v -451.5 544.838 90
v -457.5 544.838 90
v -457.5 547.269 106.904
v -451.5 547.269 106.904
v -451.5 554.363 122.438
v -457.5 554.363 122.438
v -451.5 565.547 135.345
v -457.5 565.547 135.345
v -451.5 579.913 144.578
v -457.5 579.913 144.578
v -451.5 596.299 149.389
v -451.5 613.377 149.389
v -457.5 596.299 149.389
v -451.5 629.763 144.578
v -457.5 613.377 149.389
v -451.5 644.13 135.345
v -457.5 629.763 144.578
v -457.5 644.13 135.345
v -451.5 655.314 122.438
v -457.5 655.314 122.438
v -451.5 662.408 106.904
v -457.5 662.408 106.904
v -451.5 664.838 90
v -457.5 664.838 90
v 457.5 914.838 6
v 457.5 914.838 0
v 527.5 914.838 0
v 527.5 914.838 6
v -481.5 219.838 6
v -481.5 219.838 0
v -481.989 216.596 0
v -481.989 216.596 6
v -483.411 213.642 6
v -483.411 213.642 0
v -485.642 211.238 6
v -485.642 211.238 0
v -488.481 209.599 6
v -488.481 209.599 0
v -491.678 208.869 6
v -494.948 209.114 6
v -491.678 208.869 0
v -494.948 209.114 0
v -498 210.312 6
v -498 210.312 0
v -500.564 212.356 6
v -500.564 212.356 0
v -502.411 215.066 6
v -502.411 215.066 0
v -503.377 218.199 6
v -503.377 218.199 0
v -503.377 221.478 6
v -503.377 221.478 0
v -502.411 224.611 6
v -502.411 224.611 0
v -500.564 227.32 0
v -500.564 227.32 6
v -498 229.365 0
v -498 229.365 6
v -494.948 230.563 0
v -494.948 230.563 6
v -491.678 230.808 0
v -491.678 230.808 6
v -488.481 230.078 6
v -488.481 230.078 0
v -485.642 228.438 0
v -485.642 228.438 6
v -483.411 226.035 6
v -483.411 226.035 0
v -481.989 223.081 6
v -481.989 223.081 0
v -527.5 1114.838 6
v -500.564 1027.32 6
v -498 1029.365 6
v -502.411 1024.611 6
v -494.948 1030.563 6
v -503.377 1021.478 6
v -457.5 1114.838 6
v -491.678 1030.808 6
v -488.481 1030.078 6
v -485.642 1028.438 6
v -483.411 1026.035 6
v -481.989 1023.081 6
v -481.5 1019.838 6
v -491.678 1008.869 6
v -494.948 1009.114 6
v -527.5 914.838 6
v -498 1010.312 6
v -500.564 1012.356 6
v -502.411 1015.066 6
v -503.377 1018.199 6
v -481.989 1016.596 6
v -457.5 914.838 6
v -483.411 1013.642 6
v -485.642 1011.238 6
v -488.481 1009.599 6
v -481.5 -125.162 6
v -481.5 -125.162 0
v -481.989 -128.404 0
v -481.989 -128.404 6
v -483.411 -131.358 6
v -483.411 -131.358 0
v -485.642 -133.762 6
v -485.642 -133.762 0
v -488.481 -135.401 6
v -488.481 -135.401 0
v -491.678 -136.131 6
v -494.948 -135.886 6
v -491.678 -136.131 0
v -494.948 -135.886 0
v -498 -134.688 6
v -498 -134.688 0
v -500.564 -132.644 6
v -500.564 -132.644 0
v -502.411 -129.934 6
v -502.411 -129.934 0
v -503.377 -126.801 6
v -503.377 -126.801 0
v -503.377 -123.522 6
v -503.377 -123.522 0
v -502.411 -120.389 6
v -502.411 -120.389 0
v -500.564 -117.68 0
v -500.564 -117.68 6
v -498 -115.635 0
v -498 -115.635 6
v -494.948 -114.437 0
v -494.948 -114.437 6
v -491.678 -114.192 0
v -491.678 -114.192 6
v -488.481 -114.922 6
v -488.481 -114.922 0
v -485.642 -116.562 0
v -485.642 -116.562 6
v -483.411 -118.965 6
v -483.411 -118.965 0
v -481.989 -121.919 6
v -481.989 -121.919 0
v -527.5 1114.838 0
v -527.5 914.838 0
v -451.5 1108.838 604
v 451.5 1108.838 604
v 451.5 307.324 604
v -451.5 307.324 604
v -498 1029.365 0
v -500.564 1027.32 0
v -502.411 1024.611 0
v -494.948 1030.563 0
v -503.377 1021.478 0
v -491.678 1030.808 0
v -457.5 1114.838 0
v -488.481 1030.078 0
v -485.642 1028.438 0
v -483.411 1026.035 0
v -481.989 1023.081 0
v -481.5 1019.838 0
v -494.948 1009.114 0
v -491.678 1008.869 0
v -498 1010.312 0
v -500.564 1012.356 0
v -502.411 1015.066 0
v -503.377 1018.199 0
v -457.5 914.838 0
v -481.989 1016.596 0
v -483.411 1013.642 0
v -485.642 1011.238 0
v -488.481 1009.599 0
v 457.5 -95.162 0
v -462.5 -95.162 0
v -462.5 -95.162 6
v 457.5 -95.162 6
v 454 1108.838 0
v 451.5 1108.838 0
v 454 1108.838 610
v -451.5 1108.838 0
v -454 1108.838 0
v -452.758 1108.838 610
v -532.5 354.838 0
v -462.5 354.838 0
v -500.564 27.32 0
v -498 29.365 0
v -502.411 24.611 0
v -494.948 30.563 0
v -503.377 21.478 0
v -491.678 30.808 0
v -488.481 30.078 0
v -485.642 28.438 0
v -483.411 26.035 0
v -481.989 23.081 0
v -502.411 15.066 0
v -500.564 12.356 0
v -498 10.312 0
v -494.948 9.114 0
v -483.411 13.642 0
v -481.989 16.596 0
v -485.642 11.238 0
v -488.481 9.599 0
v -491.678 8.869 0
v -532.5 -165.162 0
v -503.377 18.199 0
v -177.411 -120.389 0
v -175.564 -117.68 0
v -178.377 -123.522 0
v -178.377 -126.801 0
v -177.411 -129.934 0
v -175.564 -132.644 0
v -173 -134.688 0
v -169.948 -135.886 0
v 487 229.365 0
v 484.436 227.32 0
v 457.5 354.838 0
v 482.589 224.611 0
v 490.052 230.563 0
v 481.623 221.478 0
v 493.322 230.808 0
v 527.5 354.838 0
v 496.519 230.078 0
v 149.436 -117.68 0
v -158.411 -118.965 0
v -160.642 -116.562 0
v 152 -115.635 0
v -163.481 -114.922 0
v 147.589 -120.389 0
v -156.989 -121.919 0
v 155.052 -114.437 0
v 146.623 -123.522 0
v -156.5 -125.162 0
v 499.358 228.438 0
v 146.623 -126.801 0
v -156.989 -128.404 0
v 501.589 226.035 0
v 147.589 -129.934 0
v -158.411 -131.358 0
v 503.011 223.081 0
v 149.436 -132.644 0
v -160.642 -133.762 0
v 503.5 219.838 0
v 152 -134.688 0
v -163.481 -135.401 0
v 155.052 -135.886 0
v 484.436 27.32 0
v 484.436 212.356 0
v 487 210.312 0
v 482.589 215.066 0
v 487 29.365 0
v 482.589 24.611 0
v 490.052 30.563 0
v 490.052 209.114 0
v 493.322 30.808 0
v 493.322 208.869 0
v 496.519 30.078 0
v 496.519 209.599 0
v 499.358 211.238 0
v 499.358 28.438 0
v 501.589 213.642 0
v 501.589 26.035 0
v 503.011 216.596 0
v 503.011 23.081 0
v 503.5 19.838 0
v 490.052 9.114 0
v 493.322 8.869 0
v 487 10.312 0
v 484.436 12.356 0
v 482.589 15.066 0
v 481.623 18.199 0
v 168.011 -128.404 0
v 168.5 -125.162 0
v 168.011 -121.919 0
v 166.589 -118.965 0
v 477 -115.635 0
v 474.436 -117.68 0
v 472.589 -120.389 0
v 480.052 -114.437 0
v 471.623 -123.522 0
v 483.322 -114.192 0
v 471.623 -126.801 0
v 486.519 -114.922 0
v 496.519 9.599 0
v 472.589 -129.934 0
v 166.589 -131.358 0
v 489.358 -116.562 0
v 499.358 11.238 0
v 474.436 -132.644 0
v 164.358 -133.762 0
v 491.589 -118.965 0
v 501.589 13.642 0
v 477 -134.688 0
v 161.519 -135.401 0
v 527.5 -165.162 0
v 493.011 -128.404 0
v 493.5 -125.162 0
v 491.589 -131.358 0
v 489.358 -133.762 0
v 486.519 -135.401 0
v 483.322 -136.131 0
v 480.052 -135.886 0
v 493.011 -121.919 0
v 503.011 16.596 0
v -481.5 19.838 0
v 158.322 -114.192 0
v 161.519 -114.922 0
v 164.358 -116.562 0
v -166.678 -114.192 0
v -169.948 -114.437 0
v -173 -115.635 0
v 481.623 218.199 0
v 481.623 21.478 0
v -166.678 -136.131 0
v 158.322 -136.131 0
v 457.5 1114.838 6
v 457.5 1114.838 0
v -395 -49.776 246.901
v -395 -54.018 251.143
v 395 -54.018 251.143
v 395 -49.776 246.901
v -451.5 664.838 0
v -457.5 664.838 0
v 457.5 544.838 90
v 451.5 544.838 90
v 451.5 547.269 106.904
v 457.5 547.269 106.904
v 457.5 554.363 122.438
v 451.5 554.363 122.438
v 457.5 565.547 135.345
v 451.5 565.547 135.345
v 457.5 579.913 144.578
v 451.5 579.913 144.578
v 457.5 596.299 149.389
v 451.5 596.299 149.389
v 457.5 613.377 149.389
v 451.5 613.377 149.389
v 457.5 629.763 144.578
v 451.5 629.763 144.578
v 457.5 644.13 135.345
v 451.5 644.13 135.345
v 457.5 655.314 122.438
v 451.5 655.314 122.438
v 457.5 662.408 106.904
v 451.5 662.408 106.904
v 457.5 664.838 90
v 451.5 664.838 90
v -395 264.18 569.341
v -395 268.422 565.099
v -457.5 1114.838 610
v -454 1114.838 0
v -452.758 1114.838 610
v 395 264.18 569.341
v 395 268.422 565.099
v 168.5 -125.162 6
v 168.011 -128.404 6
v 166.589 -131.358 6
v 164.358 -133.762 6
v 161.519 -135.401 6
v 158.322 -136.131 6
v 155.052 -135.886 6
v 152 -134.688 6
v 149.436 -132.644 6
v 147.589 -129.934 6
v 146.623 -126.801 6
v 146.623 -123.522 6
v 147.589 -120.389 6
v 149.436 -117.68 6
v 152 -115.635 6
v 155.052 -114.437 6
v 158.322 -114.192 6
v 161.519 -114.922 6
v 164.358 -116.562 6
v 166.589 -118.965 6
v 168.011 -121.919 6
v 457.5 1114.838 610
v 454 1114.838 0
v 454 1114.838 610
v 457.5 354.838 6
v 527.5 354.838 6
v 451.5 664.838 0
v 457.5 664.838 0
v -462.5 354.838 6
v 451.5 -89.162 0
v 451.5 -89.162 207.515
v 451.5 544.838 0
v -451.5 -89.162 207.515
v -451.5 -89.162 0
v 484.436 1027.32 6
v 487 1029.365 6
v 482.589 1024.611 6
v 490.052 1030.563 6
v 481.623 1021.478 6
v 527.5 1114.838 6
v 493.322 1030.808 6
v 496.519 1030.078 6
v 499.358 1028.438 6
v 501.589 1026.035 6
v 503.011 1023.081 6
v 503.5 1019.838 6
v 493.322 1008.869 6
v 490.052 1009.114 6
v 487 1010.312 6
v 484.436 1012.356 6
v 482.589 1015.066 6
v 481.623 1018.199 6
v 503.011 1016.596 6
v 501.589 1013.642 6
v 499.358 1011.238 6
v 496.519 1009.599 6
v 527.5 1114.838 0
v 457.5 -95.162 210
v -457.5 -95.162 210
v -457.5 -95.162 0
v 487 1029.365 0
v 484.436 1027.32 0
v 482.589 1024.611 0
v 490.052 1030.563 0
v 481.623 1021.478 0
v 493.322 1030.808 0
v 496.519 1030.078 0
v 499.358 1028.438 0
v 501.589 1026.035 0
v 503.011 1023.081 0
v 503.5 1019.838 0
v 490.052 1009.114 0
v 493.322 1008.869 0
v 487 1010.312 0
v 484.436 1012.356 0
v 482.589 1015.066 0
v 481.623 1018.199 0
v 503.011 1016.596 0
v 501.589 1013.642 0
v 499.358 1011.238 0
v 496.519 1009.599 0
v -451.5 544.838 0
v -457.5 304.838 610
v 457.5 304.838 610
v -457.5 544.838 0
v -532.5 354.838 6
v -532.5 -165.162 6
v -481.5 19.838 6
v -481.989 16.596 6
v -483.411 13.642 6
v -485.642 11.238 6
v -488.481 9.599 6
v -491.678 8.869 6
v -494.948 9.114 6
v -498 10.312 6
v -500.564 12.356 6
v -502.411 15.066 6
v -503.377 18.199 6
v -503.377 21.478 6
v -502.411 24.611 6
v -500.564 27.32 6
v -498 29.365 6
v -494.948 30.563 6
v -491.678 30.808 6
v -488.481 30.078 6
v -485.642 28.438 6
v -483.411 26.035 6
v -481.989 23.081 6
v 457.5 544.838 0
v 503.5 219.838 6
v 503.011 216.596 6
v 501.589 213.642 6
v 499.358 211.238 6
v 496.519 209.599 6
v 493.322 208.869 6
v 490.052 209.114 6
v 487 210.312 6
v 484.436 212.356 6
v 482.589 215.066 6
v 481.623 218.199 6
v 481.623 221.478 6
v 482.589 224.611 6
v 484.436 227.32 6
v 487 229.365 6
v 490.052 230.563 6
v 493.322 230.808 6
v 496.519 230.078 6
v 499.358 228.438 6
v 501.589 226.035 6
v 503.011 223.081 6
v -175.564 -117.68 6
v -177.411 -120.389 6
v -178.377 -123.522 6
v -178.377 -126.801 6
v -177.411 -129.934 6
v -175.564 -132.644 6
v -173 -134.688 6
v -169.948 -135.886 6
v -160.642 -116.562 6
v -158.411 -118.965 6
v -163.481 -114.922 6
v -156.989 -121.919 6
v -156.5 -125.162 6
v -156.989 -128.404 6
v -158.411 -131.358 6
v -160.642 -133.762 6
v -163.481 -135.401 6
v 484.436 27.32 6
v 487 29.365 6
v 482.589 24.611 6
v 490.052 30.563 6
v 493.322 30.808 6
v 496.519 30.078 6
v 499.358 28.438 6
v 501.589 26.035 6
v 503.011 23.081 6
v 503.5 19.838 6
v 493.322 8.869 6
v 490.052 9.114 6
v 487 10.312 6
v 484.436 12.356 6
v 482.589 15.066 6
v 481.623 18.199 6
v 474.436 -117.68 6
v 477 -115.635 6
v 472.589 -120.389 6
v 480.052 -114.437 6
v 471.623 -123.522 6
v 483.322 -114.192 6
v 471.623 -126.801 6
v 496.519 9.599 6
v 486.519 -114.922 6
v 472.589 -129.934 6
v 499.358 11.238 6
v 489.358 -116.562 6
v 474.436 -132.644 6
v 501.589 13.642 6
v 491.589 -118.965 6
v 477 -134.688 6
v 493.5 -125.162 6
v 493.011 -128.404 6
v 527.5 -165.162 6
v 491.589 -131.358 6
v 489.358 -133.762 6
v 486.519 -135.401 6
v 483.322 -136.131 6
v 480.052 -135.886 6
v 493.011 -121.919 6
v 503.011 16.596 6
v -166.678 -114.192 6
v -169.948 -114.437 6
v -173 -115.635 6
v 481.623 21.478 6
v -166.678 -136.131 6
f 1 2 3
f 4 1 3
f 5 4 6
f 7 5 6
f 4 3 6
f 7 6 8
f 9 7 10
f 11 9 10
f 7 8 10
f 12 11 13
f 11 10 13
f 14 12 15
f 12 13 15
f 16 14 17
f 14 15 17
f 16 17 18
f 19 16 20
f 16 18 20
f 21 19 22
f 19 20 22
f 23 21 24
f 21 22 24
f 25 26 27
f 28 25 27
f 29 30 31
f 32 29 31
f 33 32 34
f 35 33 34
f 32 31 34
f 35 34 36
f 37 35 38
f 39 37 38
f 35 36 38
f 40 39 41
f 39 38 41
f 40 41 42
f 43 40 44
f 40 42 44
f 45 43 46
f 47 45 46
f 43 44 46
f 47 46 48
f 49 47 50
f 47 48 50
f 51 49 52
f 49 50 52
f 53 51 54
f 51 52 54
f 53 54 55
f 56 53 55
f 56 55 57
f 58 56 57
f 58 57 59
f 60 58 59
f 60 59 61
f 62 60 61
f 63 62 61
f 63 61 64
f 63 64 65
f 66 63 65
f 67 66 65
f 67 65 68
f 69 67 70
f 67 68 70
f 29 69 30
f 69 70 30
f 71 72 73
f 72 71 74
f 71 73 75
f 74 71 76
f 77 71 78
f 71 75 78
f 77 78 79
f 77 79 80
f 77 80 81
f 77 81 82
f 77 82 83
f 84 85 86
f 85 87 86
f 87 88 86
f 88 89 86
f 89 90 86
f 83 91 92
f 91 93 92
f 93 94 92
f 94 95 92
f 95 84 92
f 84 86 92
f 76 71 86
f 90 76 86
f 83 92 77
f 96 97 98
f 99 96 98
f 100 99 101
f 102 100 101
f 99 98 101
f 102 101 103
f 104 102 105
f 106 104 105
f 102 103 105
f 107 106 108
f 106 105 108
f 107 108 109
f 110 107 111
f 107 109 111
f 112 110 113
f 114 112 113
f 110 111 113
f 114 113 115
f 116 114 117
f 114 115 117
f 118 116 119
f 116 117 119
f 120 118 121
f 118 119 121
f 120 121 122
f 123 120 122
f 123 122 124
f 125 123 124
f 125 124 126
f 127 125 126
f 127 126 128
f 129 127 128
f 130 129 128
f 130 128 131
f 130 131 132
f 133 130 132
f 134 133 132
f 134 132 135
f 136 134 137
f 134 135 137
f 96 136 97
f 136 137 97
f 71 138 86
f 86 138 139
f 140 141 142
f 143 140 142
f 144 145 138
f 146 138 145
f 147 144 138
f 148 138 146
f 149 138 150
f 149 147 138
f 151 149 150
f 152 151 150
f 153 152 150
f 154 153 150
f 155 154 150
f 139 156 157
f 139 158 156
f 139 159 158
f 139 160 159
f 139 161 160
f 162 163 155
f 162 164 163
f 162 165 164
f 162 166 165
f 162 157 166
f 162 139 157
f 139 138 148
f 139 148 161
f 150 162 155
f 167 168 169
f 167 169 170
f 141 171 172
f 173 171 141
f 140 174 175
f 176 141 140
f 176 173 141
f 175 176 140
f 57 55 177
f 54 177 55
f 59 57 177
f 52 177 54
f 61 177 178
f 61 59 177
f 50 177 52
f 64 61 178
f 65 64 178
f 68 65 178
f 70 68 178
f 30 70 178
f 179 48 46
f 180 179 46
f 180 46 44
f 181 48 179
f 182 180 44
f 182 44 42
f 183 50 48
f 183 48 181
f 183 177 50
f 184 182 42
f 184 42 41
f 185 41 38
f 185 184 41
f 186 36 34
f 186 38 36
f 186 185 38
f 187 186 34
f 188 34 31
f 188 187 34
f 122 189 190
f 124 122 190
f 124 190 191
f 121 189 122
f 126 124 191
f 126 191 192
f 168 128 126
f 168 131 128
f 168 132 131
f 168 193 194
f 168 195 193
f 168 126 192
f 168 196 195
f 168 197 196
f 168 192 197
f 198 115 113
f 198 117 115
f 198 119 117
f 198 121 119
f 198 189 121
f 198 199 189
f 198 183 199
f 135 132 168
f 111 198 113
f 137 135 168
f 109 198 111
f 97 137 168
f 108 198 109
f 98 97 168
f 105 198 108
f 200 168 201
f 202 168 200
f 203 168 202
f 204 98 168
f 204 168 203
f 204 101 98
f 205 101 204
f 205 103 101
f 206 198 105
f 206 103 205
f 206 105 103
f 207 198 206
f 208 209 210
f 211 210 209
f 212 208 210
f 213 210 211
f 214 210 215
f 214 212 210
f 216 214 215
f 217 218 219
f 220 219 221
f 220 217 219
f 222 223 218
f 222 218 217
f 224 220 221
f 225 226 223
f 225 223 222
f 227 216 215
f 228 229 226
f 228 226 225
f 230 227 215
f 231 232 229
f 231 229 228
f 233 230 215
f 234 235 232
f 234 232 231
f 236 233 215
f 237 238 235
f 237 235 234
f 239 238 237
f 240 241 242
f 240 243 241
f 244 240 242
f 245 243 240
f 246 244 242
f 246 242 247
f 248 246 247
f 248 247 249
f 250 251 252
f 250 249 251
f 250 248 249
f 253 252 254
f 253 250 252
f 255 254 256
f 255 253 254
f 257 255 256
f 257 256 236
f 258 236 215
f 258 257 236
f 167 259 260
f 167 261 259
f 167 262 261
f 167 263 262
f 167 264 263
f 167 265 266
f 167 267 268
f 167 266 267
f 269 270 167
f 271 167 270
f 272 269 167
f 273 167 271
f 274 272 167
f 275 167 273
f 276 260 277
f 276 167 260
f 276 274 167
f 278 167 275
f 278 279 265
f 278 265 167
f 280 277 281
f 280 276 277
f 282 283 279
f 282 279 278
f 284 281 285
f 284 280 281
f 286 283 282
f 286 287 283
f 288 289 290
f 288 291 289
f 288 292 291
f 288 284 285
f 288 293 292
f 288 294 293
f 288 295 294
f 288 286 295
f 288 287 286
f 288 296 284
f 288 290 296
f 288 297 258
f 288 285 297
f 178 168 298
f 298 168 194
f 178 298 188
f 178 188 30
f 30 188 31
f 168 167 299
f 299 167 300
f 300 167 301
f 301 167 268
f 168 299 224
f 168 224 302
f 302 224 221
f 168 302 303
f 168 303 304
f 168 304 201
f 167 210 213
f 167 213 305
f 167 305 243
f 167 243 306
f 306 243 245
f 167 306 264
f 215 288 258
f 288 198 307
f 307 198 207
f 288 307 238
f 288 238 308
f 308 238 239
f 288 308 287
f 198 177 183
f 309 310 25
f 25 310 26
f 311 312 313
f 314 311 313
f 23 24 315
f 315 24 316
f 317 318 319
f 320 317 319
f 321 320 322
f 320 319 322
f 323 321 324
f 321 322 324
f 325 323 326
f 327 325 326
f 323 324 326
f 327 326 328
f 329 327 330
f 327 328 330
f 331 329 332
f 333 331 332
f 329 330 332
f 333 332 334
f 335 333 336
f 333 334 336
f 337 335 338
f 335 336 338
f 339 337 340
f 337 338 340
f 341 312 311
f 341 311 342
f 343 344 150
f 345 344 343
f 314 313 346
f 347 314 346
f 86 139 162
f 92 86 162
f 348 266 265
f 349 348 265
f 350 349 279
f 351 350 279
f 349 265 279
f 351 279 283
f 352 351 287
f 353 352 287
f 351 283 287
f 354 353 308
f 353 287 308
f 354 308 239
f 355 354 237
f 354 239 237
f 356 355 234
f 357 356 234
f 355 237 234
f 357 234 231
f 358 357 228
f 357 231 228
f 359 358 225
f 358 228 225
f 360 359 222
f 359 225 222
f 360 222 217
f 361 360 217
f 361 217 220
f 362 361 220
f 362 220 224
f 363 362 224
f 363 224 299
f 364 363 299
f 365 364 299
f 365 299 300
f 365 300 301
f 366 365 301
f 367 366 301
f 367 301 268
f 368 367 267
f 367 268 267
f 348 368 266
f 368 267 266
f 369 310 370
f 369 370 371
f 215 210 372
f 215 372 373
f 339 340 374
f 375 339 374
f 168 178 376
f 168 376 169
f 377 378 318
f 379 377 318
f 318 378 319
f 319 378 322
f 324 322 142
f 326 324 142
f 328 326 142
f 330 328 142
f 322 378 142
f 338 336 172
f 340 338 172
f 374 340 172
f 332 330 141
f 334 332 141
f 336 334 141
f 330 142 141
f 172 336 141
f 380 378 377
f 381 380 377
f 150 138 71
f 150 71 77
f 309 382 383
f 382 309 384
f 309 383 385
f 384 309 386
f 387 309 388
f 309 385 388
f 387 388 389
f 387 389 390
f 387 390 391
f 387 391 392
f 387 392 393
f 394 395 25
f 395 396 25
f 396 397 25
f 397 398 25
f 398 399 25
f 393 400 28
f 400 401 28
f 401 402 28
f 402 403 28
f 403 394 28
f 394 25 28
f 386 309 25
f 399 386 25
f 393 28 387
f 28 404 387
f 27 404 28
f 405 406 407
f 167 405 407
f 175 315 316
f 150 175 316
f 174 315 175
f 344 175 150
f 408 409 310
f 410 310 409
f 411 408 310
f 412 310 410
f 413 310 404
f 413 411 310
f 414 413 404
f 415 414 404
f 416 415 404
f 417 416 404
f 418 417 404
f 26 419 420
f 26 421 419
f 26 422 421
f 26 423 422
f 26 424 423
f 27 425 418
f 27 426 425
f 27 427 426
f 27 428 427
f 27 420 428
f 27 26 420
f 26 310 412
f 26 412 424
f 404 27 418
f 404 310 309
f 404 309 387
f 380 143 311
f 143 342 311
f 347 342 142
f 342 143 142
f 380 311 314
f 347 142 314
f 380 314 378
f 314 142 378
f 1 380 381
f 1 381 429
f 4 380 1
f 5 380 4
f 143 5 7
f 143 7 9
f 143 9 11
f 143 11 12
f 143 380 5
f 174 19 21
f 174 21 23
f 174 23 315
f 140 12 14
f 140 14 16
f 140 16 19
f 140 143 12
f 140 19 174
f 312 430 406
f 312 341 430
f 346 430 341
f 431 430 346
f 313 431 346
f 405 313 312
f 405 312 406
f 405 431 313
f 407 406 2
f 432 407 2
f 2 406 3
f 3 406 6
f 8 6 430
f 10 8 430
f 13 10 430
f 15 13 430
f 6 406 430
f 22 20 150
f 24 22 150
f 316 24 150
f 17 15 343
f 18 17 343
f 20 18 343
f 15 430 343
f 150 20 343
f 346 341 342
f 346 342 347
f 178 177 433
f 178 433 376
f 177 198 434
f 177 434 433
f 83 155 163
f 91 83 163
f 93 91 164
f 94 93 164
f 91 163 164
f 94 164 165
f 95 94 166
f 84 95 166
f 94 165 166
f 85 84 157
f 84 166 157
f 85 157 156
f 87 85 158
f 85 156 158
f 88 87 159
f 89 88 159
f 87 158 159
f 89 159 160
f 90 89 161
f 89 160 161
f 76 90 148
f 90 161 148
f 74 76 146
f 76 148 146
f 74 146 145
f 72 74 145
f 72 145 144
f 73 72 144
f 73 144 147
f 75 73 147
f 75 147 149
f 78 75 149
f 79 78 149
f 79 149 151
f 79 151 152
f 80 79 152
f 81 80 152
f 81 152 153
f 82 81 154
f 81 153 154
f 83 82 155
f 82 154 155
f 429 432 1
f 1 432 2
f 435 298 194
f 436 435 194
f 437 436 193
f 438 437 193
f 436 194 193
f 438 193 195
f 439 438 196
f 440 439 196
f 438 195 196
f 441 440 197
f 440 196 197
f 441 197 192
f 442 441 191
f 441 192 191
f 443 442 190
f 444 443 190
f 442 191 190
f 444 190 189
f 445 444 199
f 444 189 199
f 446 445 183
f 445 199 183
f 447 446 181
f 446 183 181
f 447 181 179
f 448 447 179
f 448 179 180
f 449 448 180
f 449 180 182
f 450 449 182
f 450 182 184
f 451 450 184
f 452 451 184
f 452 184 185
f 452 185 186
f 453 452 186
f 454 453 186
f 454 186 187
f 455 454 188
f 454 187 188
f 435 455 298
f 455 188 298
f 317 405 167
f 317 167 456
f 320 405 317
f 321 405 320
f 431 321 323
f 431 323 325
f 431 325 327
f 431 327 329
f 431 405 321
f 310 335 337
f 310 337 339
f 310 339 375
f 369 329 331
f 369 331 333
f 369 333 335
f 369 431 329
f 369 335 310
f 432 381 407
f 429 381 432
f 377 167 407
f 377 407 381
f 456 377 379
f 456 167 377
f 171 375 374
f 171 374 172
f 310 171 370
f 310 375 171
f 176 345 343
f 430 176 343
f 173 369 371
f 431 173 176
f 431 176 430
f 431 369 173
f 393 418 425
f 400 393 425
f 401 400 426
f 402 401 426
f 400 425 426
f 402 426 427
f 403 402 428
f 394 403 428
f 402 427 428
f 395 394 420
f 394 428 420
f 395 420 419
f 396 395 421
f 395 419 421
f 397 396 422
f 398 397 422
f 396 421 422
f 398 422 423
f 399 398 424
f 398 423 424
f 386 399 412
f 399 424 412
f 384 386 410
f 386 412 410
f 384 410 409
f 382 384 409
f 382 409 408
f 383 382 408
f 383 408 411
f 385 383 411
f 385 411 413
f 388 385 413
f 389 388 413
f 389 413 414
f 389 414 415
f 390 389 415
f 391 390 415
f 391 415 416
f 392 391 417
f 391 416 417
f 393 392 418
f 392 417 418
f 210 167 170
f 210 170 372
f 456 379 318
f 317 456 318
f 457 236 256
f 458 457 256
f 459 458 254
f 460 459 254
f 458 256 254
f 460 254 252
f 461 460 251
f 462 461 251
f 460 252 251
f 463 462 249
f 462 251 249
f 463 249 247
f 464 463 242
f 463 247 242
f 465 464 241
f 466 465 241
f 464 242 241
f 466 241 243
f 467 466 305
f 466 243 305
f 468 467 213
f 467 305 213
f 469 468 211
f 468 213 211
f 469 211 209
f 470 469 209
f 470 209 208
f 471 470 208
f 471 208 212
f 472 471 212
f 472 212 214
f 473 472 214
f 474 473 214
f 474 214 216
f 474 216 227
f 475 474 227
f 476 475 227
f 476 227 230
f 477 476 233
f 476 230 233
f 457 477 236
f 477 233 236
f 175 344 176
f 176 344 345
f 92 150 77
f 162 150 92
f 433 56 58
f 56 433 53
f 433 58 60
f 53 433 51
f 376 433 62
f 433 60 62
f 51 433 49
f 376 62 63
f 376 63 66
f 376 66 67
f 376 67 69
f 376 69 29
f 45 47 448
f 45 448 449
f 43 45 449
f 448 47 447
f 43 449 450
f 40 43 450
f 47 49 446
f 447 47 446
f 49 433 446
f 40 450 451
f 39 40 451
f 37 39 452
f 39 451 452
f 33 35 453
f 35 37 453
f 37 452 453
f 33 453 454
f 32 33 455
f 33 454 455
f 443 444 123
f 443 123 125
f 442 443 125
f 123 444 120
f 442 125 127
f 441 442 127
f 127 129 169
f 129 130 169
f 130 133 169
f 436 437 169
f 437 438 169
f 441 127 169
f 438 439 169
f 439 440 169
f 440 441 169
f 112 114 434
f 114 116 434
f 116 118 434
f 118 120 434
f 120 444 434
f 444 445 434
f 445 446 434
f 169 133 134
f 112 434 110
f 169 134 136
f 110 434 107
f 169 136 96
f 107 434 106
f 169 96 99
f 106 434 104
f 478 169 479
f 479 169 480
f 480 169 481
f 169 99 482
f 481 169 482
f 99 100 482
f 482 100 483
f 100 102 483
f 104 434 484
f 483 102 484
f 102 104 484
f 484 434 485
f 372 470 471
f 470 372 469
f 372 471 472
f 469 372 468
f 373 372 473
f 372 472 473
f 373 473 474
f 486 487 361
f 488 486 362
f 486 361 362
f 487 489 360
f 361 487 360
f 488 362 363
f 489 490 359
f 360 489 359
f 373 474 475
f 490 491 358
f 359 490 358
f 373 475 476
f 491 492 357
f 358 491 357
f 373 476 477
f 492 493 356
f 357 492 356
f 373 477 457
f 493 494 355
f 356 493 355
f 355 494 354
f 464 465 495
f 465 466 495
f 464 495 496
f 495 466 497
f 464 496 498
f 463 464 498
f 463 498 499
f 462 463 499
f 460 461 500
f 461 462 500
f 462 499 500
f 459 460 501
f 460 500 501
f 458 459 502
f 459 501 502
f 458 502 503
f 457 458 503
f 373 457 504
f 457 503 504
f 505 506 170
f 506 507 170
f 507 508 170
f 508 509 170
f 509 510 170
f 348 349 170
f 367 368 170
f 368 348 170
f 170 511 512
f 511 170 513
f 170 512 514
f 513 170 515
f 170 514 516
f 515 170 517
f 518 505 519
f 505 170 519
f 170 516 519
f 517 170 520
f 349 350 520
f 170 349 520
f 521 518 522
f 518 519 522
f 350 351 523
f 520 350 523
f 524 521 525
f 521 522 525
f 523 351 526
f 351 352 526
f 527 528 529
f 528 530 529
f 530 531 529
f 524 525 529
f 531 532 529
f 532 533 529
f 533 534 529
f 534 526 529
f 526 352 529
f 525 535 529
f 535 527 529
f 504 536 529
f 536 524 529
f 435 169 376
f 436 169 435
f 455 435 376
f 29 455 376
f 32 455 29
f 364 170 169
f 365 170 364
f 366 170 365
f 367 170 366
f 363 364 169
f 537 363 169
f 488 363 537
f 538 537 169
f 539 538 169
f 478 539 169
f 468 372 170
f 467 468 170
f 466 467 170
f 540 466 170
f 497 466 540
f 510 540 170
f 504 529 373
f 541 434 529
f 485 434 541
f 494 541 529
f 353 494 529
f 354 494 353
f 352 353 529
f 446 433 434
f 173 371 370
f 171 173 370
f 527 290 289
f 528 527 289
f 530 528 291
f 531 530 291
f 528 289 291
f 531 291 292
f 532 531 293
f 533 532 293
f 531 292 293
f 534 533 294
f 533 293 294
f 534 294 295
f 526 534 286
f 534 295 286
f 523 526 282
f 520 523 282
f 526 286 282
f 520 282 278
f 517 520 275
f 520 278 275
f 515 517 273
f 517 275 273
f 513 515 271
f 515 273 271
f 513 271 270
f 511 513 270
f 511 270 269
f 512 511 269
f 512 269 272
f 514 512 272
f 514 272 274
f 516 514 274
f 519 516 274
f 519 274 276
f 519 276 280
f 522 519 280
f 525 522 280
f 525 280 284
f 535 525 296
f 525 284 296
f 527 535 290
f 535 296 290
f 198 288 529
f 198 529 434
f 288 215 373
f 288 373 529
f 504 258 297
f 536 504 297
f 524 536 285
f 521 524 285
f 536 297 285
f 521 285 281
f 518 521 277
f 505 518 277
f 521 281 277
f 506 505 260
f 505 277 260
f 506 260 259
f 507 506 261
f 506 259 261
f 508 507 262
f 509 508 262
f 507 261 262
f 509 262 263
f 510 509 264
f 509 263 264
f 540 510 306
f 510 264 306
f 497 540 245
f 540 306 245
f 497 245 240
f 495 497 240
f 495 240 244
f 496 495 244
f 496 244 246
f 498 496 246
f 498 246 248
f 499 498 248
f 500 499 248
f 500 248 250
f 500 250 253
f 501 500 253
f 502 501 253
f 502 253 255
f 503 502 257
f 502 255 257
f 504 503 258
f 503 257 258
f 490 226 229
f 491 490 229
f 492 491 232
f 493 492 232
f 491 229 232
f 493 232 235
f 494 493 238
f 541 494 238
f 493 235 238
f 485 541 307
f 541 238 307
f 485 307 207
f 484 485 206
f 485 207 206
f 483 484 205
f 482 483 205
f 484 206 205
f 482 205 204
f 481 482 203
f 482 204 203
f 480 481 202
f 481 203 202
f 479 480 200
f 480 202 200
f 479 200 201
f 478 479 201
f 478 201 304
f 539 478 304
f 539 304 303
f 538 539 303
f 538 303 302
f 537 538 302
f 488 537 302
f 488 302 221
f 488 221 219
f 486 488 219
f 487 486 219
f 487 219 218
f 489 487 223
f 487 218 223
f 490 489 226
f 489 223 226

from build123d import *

# Parameters (mm, degrees)
F1_DEPTH  = 457.5
F2_T      = -6
F4_DEPTH  = 6
F5_R      = 11
F6_DEPTH  = 6
F5_W      = 70
F5_H      = 200
F8_DEPTH  = 985.001
F9_W      = 790
F9_H      = 450
F10_DEPTH = 6


with BuildPart() as f1:
    # F0 (on Right) → F1 (new body, symmetric)
    with BuildSketch(Plane.YZ):
        Polygon((-95.1616466045, 0), (1114.8383533955, 0), (1114.8383533955, 610), (304.8383533955, 610), (-95.1616466045, 210), align=None)
    extrude(amount=F1_DEPTH, both=True)

    # F2
    f2_openings = [f1.faces().sort_by_distance(p)[0] for p in [
        (0, 509.838353, 0),
    ]]
    offset(amount=F2_T, openings=f2_openings)

    # F3 (on face) → F4 (cut)
    with BuildSketch(Plane(origin=(0, 1114.8383533955, 0), x_dir=(-1, 0, 0), z_dir=(0, 1, 0))):
        Polygon((454, 0), (452.7580738068, 610), (-454, 610), (-454, 0), align=None)
    extrude(amount=-F4_DEPTH, mode=Mode.SUBTRACT)

    # F7 (on face) → F8 (cut, through all)
    with BuildSketch(Plane(origin=(-457.5, 0, 0), x_dir=(0, -1, 0), z_dir=(-1, 0, 0))):
        with BuildLine():
            Line((-664.8383533955, 90), (-664.8383533955, 0))
            Line((-664.8383533955, 0), (-544.8383533955, 0))
            Line((-544.8383533955, 0), (-544.8383533955, 90))
            ThreePointArc((-544.8383533955, 90), (-604.8383533955, 150), (-664.8383533955, 90))
        make_face()
    extrude(amount=-F8_DEPTH, mode=Mode.SUBTRACT)

    # F9 (on face) → F10 (cut)
    with BuildSketch(Plane(origin=(0, -152.5808233023, 152.5808233023), x_dir=(1, 0, 0), z_dir=(0, -0.7071067812, 0.7071067812))):
        with Locations((0, 364.3884033755)):
            Rectangle(F9_W, F9_H)
    extrude(amount=-F10_DEPTH, mode=Mode.SUBTRACT)


with BuildPart() as f6:
    # F5 (on face) → F6 (new body)
    with BuildSketch(Plane(origin=(0, 0, 0), x_dir=(1, 0, 0), z_dir=(0, 0, -1))):
        Polygon((-532.5, -354.8383533955), (-462.5, -354.8383533955), (-462.5, 95.1616466045), (457.5, 95.1616466045), (457.5, -354.8383533955), (527.5, -354.8383533955), (527.5, 165.1616466045), (-532.5, 165.1616466045), align=None)
        with Locations((-492.5, -219.8383533955)):
            Circle(F5_R, mode=Mode.SUBTRACT)
        with Locations((-492.5, -19.8383533955)):
            Circle(F5_R, mode=Mode.SUBTRACT)
        with Locations((-492.5, 125.1616466045)):
            Circle(F5_R, mode=Mode.SUBTRACT)
        with Locations((-167.5, 125.1616466045)):
            Circle(F5_R, mode=Mode.SUBTRACT)
        with Locations((492.5, -219.8383533955)):
            Circle(F5_R, mode=Mode.SUBTRACT)
        with Locations((157.5, 125.1616466045)):
            Circle(F5_R, mode=Mode.SUBTRACT)
        with Locations((492.5, -19.8383533955)):
            Circle(F5_R, mode=Mode.SUBTRACT)
        with Locations((482.5, 125.1616466045)):
            Circle(F5_R, mode=Mode.SUBTRACT)
    extrude(amount=-F6_DEPTH)


with BuildPart() as f6b:
    # F5 (on face) → F6, piece 2 (new body)
    with BuildSketch(Plane(origin=(0, 0, 0), x_dir=(1, 0, 0), z_dir=(0, 0, -1))):
        with Locations((-492.5, -1014.8383533955)):
            Rectangle(F5_W, F5_H)
        with Locations((-492.5, -1019.8383533955)):
            Circle(F5_R, mode=Mode.SUBTRACT)
    extrude(amount=-F6_DEPTH)


with BuildPart() as f6c:
    # F5 (on face) → F6, piece 3 (new body)
    with BuildSketch(Plane(origin=(0, 0, 0), x_dir=(1, 0, 0), z_dir=(0, 0, -1))):
        with Locations((492.5, -1014.8383533955)):
            Rectangle(F5_W, F5_H)
        with Locations((492.5, -1019.8383533955)):
            Circle(F5_R, mode=Mode.SUBTRACT)
    extrude(amount=-F6_DEPTH)


solid = Compound([f1.part, f6.part, f6b.part, f6c.part])
